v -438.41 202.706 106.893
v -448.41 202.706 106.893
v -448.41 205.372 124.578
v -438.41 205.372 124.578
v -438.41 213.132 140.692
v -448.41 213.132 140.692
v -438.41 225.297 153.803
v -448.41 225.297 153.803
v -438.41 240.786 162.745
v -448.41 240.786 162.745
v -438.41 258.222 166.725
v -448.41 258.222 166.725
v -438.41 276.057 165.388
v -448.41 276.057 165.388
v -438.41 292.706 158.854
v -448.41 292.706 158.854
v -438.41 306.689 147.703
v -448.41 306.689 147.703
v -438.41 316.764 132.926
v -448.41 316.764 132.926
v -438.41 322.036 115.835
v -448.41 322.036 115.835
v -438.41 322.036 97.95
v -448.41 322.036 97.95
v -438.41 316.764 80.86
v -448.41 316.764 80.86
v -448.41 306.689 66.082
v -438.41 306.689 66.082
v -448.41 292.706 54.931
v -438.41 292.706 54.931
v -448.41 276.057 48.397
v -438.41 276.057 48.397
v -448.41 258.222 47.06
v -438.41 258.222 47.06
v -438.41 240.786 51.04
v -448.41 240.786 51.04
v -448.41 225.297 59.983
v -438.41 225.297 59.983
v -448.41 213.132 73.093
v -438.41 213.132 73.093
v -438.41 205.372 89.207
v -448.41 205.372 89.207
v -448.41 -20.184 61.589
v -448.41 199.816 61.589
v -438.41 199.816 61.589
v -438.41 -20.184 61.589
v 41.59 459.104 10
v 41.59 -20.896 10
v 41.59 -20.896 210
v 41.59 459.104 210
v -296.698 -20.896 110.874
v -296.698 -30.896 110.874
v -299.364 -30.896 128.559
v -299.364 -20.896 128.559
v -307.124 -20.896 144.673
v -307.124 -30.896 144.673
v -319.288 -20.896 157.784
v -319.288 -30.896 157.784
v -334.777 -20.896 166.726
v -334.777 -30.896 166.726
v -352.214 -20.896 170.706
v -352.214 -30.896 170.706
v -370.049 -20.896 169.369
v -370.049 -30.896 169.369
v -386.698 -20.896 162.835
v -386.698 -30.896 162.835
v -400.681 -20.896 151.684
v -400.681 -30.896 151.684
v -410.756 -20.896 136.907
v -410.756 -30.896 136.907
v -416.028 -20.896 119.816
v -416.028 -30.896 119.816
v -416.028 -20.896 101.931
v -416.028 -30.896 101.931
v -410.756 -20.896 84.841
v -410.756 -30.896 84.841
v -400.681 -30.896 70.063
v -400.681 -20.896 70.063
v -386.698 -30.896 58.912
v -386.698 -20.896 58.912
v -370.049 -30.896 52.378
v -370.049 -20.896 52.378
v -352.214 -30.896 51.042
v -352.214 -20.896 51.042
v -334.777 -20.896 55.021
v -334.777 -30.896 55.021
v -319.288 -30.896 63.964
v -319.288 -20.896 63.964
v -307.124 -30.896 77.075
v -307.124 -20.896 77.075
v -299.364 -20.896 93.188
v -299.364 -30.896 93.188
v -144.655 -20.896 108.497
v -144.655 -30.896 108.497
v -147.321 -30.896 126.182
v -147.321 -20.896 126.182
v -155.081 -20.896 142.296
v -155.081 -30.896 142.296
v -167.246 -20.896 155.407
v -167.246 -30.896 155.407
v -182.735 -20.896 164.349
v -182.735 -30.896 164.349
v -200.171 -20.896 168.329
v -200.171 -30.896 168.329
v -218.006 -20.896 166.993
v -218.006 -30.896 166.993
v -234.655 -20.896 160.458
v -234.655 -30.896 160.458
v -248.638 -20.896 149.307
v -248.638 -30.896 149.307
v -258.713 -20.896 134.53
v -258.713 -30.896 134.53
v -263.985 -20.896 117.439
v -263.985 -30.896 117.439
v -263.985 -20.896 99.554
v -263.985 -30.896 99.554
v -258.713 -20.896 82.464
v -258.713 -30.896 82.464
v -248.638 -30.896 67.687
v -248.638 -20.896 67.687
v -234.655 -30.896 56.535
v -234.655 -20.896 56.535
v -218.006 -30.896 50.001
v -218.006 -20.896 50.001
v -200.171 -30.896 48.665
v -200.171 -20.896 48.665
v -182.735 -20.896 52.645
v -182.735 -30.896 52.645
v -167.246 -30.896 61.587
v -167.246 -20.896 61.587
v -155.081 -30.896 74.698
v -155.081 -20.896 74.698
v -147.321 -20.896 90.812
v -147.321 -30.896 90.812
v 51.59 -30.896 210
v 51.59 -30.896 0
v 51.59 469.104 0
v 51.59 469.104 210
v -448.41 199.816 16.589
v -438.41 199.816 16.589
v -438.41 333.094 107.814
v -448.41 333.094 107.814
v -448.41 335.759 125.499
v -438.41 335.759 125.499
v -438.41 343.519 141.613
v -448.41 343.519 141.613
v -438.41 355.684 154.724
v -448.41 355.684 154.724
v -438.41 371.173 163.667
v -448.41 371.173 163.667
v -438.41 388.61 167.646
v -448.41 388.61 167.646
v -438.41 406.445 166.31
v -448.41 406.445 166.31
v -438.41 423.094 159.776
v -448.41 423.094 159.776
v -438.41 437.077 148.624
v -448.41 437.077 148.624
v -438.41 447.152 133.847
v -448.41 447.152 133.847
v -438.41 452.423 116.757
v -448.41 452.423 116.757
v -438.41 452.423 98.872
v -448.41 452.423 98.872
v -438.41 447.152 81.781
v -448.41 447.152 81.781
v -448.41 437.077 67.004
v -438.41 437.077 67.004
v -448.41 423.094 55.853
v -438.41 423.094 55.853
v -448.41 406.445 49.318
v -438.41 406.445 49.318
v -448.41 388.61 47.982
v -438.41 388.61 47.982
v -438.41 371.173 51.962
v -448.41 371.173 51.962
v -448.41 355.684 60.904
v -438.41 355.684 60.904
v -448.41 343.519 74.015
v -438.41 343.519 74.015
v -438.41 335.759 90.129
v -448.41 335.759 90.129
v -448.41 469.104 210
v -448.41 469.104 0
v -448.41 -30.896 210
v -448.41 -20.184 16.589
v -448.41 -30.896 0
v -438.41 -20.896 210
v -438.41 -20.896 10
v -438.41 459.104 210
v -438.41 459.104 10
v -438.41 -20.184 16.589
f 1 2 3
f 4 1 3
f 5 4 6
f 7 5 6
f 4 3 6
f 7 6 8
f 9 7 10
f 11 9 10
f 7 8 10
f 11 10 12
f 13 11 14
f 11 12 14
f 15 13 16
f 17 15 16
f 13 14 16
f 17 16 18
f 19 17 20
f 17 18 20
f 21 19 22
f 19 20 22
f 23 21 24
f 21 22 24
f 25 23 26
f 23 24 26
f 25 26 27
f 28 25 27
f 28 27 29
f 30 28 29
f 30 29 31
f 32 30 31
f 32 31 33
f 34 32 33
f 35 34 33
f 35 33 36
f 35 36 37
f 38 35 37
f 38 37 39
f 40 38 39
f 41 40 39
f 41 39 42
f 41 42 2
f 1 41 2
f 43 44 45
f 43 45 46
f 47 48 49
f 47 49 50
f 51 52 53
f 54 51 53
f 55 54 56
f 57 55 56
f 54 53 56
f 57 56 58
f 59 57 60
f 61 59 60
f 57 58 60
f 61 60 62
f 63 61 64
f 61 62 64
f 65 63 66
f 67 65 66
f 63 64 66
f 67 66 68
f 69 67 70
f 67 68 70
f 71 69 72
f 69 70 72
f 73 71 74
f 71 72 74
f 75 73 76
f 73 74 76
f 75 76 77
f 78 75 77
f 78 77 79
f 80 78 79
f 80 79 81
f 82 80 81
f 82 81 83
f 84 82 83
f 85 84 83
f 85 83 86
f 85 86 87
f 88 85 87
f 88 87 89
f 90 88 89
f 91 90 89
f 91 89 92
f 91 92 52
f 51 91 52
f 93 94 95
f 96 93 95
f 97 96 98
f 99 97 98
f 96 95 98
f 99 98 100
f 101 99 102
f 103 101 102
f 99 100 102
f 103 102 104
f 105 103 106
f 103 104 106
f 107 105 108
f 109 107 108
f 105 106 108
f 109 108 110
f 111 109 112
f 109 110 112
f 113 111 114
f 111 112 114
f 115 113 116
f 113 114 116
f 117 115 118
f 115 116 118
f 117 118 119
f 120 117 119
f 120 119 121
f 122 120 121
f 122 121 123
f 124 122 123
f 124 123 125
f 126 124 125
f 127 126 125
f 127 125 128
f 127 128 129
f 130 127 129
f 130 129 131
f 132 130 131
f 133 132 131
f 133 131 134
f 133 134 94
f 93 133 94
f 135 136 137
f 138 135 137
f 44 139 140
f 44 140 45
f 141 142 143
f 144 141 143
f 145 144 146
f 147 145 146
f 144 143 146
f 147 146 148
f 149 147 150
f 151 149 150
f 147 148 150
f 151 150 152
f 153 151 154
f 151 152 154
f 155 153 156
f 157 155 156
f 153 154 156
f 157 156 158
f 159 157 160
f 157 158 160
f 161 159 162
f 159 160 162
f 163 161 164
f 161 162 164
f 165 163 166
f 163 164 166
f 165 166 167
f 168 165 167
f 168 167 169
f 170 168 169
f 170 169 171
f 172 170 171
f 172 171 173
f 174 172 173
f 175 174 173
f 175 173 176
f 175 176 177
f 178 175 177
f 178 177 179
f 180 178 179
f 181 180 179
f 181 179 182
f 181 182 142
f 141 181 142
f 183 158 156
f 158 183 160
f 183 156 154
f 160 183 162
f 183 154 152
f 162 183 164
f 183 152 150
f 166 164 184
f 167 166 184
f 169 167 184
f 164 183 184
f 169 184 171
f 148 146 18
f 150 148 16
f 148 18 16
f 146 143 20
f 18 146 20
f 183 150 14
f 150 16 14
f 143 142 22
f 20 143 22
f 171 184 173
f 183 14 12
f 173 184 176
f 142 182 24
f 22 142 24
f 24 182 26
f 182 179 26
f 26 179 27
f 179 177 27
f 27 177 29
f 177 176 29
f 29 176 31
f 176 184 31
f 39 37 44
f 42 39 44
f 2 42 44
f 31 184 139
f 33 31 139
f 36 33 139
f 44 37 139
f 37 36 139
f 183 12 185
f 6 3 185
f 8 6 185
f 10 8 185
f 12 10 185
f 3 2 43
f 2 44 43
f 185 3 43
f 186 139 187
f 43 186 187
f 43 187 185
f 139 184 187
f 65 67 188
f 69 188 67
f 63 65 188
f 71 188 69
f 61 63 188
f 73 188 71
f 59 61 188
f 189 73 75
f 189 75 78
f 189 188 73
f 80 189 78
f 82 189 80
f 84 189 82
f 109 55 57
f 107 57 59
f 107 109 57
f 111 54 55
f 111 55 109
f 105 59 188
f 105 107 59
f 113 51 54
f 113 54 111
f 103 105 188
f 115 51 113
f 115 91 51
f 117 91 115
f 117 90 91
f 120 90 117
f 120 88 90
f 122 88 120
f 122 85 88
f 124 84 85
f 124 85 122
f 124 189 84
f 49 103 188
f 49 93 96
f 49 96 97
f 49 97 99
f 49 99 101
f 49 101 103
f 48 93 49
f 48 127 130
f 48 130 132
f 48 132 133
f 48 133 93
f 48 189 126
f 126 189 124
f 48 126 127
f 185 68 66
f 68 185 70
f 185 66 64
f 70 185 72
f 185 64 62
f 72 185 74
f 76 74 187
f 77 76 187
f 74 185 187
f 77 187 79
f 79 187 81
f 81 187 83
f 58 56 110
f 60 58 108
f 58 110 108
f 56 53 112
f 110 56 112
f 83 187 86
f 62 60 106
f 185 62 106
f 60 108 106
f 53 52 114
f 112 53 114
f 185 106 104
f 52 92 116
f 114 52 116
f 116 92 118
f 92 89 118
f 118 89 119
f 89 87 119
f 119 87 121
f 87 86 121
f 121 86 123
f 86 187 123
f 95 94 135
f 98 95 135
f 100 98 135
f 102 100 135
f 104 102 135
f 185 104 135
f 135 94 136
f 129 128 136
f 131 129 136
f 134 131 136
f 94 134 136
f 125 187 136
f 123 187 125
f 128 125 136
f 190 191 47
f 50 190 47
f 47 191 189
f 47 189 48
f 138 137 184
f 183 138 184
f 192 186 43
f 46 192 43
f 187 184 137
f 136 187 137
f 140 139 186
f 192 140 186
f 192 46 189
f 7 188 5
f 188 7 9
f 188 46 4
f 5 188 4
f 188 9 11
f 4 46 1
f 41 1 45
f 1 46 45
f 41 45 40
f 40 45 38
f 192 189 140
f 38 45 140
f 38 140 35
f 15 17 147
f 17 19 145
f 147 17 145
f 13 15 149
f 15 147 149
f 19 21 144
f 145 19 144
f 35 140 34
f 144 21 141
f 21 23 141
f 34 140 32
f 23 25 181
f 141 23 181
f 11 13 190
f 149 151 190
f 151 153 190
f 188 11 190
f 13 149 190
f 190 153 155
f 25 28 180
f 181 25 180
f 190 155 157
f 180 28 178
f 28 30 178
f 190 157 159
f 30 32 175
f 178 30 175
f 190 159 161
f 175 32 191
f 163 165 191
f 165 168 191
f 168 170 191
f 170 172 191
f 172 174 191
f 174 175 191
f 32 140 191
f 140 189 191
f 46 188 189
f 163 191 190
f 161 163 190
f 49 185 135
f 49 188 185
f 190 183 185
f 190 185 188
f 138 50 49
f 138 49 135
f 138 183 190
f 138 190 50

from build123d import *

# Parameters (mm, degrees)
F0_W         = 500
F0_H         = 500
F1_DEPTH     = 10
F2_W         = 500
F2_H         = 10
F3_DEPTH     = 200
F4_W         = 10
F4_H         = 490
F5_DEPTH     = 250
F6_W         = 490
F6_H         = 10
F7_DEPTH     = 250
F8_W         = 10
F8_H         = 480
F9_DEPTH     = 250
F10_DEPTH    = 50
F10_FACE_W   = 500
F10_FACE_H   = 500
F10_FACE_W_2 = 480
F10_FACE_H_2 = 480
F11_DEPTH    = 50
F12_R        = 60
F13_DEPTH    = 70
F14_R        = 60
F15_DEPTH    = 122
F16_W        = 220
F16_H        = 45
F17_DEPTH    = 25
F18_R        = 60
F19_DEPTH    = 25
F20_R        = 60
F21_DEPTH    = 25


with BuildPart() as f1:
    # F0 (on Top) → F1 (new body)
    with BuildSketch(Plane.XY):
        with Locations((-198.410127, 219.103556)):
            Rectangle(F0_W, F0_H)
    extrude(amount=F1_DEPTH)

    # F2 (on face) → F3 (join)
    with BuildSketch(Plane.XY.offset(10)):
        with Locations((-198.410127, 464.103556)):
            Rectangle(F2_W, F2_H)
    extrude(amount=F3_DEPTH)

    # F4 (on face) → F5 (join)
    with BuildSketch(Plane.XY.offset(10)):
        with Locations((46.589873, 214.103556)):
            Rectangle(F4_W, F4_H)
    extrude(amount=F5_DEPTH)

    # F6 (on face) → F7 (join)
    with BuildSketch(Plane.XY.offset(10)):
        with Locations((-203.410127, -25.896444)):
            Rectangle(F6_W, F6_H)
    extrude(amount=F7_DEPTH)

    # F8 (on face) → F9 (join)
    with BuildSketch(Plane.XY.offset(10)):
        with Locations((-443.410127, 219.103556)):
            Rectangle(F8_W, F8_H)
    extrude(amount=F9_DEPTH)

    # F3_face (on face) → F10 (join)
    with BuildSketch(Plane(origin=(-198.410127, 464.103556, 210), x_dir=(1, 0, 0), z_dir=(0, 0, 1))):
        Polygon((-250, -5), (-240, -5), (240, -5), (250, -5), (250, 5), (-250, 5), align=None)
    extrude(amount=F10_DEPTH)

    # F10_face (on face) → F11 (cut)
    with BuildSketch(Plane(origin=(-198.410127, 219.103556, 260), x_dir=(1, 0, 0), z_dir=(0, 0, 1))):
        Rectangle(F10_FACE_W, F10_FACE_H)
        Rectangle(F10_FACE_W_2, F10_FACE_H_2, mode=Mode.SUBTRACT)
    extrude(amount=-F11_DEPTH, mode=Mode.SUBTRACT)

    # F12 (on face) → F13 (cut)
    with BuildSketch(Plane.XZ.offset(30.896444)):
        with Locations((-356.697887, 110.873759)):
            Circle(F12_R)
    extrude(amount=-F13_DEPTH, mode=Mode.SUBTRACT)

    # F14 (on face) → F15 (cut)
    with BuildSketch(Plane.XZ.offset(30.896444)):
        with Locations((-204.655066, 108.496942)):
            Circle(F14_R)
    extrude(amount=-F15_DEPTH, mode=Mode.SUBTRACT)

    # F16 (on face) → F17 (cut)
    with BuildSketch(Plane(origin=(-448.410127, 0, 0), x_dir=(0, -1, 0), z_dir=(-1, 0, 0))):
        with Locations((-89.816239, 39.089018)):
            Rectangle(F16_W, F16_H)
    extrude(amount=-F17_DEPTH, mode=Mode.SUBTRACT)

    # F18 (on face) → F19 (cut)
    with BuildSketch(Plane(origin=(-448.410127, 0, 0), x_dir=(0, -1, 0), z_dir=(-1, 0, 0))):
        with Locations((-393.093586, 107.814118)):
            Circle(F18_R)
    extrude(amount=-F19_DEPTH, mode=Mode.SUBTRACT)

    # F20 (on face) → F21 (cut)
    with BuildSketch(Plane(origin=(-448.410127, 0, 0), x_dir=(0, -1, 0), z_dir=(-1, 0, 0))):
        with Locations((-262.70619, 106.892653)):
            Circle(F20_R)
    extrude(amount=-F21_DEPTH, mode=Mode.SUBTRACT)


solid = f1.part
